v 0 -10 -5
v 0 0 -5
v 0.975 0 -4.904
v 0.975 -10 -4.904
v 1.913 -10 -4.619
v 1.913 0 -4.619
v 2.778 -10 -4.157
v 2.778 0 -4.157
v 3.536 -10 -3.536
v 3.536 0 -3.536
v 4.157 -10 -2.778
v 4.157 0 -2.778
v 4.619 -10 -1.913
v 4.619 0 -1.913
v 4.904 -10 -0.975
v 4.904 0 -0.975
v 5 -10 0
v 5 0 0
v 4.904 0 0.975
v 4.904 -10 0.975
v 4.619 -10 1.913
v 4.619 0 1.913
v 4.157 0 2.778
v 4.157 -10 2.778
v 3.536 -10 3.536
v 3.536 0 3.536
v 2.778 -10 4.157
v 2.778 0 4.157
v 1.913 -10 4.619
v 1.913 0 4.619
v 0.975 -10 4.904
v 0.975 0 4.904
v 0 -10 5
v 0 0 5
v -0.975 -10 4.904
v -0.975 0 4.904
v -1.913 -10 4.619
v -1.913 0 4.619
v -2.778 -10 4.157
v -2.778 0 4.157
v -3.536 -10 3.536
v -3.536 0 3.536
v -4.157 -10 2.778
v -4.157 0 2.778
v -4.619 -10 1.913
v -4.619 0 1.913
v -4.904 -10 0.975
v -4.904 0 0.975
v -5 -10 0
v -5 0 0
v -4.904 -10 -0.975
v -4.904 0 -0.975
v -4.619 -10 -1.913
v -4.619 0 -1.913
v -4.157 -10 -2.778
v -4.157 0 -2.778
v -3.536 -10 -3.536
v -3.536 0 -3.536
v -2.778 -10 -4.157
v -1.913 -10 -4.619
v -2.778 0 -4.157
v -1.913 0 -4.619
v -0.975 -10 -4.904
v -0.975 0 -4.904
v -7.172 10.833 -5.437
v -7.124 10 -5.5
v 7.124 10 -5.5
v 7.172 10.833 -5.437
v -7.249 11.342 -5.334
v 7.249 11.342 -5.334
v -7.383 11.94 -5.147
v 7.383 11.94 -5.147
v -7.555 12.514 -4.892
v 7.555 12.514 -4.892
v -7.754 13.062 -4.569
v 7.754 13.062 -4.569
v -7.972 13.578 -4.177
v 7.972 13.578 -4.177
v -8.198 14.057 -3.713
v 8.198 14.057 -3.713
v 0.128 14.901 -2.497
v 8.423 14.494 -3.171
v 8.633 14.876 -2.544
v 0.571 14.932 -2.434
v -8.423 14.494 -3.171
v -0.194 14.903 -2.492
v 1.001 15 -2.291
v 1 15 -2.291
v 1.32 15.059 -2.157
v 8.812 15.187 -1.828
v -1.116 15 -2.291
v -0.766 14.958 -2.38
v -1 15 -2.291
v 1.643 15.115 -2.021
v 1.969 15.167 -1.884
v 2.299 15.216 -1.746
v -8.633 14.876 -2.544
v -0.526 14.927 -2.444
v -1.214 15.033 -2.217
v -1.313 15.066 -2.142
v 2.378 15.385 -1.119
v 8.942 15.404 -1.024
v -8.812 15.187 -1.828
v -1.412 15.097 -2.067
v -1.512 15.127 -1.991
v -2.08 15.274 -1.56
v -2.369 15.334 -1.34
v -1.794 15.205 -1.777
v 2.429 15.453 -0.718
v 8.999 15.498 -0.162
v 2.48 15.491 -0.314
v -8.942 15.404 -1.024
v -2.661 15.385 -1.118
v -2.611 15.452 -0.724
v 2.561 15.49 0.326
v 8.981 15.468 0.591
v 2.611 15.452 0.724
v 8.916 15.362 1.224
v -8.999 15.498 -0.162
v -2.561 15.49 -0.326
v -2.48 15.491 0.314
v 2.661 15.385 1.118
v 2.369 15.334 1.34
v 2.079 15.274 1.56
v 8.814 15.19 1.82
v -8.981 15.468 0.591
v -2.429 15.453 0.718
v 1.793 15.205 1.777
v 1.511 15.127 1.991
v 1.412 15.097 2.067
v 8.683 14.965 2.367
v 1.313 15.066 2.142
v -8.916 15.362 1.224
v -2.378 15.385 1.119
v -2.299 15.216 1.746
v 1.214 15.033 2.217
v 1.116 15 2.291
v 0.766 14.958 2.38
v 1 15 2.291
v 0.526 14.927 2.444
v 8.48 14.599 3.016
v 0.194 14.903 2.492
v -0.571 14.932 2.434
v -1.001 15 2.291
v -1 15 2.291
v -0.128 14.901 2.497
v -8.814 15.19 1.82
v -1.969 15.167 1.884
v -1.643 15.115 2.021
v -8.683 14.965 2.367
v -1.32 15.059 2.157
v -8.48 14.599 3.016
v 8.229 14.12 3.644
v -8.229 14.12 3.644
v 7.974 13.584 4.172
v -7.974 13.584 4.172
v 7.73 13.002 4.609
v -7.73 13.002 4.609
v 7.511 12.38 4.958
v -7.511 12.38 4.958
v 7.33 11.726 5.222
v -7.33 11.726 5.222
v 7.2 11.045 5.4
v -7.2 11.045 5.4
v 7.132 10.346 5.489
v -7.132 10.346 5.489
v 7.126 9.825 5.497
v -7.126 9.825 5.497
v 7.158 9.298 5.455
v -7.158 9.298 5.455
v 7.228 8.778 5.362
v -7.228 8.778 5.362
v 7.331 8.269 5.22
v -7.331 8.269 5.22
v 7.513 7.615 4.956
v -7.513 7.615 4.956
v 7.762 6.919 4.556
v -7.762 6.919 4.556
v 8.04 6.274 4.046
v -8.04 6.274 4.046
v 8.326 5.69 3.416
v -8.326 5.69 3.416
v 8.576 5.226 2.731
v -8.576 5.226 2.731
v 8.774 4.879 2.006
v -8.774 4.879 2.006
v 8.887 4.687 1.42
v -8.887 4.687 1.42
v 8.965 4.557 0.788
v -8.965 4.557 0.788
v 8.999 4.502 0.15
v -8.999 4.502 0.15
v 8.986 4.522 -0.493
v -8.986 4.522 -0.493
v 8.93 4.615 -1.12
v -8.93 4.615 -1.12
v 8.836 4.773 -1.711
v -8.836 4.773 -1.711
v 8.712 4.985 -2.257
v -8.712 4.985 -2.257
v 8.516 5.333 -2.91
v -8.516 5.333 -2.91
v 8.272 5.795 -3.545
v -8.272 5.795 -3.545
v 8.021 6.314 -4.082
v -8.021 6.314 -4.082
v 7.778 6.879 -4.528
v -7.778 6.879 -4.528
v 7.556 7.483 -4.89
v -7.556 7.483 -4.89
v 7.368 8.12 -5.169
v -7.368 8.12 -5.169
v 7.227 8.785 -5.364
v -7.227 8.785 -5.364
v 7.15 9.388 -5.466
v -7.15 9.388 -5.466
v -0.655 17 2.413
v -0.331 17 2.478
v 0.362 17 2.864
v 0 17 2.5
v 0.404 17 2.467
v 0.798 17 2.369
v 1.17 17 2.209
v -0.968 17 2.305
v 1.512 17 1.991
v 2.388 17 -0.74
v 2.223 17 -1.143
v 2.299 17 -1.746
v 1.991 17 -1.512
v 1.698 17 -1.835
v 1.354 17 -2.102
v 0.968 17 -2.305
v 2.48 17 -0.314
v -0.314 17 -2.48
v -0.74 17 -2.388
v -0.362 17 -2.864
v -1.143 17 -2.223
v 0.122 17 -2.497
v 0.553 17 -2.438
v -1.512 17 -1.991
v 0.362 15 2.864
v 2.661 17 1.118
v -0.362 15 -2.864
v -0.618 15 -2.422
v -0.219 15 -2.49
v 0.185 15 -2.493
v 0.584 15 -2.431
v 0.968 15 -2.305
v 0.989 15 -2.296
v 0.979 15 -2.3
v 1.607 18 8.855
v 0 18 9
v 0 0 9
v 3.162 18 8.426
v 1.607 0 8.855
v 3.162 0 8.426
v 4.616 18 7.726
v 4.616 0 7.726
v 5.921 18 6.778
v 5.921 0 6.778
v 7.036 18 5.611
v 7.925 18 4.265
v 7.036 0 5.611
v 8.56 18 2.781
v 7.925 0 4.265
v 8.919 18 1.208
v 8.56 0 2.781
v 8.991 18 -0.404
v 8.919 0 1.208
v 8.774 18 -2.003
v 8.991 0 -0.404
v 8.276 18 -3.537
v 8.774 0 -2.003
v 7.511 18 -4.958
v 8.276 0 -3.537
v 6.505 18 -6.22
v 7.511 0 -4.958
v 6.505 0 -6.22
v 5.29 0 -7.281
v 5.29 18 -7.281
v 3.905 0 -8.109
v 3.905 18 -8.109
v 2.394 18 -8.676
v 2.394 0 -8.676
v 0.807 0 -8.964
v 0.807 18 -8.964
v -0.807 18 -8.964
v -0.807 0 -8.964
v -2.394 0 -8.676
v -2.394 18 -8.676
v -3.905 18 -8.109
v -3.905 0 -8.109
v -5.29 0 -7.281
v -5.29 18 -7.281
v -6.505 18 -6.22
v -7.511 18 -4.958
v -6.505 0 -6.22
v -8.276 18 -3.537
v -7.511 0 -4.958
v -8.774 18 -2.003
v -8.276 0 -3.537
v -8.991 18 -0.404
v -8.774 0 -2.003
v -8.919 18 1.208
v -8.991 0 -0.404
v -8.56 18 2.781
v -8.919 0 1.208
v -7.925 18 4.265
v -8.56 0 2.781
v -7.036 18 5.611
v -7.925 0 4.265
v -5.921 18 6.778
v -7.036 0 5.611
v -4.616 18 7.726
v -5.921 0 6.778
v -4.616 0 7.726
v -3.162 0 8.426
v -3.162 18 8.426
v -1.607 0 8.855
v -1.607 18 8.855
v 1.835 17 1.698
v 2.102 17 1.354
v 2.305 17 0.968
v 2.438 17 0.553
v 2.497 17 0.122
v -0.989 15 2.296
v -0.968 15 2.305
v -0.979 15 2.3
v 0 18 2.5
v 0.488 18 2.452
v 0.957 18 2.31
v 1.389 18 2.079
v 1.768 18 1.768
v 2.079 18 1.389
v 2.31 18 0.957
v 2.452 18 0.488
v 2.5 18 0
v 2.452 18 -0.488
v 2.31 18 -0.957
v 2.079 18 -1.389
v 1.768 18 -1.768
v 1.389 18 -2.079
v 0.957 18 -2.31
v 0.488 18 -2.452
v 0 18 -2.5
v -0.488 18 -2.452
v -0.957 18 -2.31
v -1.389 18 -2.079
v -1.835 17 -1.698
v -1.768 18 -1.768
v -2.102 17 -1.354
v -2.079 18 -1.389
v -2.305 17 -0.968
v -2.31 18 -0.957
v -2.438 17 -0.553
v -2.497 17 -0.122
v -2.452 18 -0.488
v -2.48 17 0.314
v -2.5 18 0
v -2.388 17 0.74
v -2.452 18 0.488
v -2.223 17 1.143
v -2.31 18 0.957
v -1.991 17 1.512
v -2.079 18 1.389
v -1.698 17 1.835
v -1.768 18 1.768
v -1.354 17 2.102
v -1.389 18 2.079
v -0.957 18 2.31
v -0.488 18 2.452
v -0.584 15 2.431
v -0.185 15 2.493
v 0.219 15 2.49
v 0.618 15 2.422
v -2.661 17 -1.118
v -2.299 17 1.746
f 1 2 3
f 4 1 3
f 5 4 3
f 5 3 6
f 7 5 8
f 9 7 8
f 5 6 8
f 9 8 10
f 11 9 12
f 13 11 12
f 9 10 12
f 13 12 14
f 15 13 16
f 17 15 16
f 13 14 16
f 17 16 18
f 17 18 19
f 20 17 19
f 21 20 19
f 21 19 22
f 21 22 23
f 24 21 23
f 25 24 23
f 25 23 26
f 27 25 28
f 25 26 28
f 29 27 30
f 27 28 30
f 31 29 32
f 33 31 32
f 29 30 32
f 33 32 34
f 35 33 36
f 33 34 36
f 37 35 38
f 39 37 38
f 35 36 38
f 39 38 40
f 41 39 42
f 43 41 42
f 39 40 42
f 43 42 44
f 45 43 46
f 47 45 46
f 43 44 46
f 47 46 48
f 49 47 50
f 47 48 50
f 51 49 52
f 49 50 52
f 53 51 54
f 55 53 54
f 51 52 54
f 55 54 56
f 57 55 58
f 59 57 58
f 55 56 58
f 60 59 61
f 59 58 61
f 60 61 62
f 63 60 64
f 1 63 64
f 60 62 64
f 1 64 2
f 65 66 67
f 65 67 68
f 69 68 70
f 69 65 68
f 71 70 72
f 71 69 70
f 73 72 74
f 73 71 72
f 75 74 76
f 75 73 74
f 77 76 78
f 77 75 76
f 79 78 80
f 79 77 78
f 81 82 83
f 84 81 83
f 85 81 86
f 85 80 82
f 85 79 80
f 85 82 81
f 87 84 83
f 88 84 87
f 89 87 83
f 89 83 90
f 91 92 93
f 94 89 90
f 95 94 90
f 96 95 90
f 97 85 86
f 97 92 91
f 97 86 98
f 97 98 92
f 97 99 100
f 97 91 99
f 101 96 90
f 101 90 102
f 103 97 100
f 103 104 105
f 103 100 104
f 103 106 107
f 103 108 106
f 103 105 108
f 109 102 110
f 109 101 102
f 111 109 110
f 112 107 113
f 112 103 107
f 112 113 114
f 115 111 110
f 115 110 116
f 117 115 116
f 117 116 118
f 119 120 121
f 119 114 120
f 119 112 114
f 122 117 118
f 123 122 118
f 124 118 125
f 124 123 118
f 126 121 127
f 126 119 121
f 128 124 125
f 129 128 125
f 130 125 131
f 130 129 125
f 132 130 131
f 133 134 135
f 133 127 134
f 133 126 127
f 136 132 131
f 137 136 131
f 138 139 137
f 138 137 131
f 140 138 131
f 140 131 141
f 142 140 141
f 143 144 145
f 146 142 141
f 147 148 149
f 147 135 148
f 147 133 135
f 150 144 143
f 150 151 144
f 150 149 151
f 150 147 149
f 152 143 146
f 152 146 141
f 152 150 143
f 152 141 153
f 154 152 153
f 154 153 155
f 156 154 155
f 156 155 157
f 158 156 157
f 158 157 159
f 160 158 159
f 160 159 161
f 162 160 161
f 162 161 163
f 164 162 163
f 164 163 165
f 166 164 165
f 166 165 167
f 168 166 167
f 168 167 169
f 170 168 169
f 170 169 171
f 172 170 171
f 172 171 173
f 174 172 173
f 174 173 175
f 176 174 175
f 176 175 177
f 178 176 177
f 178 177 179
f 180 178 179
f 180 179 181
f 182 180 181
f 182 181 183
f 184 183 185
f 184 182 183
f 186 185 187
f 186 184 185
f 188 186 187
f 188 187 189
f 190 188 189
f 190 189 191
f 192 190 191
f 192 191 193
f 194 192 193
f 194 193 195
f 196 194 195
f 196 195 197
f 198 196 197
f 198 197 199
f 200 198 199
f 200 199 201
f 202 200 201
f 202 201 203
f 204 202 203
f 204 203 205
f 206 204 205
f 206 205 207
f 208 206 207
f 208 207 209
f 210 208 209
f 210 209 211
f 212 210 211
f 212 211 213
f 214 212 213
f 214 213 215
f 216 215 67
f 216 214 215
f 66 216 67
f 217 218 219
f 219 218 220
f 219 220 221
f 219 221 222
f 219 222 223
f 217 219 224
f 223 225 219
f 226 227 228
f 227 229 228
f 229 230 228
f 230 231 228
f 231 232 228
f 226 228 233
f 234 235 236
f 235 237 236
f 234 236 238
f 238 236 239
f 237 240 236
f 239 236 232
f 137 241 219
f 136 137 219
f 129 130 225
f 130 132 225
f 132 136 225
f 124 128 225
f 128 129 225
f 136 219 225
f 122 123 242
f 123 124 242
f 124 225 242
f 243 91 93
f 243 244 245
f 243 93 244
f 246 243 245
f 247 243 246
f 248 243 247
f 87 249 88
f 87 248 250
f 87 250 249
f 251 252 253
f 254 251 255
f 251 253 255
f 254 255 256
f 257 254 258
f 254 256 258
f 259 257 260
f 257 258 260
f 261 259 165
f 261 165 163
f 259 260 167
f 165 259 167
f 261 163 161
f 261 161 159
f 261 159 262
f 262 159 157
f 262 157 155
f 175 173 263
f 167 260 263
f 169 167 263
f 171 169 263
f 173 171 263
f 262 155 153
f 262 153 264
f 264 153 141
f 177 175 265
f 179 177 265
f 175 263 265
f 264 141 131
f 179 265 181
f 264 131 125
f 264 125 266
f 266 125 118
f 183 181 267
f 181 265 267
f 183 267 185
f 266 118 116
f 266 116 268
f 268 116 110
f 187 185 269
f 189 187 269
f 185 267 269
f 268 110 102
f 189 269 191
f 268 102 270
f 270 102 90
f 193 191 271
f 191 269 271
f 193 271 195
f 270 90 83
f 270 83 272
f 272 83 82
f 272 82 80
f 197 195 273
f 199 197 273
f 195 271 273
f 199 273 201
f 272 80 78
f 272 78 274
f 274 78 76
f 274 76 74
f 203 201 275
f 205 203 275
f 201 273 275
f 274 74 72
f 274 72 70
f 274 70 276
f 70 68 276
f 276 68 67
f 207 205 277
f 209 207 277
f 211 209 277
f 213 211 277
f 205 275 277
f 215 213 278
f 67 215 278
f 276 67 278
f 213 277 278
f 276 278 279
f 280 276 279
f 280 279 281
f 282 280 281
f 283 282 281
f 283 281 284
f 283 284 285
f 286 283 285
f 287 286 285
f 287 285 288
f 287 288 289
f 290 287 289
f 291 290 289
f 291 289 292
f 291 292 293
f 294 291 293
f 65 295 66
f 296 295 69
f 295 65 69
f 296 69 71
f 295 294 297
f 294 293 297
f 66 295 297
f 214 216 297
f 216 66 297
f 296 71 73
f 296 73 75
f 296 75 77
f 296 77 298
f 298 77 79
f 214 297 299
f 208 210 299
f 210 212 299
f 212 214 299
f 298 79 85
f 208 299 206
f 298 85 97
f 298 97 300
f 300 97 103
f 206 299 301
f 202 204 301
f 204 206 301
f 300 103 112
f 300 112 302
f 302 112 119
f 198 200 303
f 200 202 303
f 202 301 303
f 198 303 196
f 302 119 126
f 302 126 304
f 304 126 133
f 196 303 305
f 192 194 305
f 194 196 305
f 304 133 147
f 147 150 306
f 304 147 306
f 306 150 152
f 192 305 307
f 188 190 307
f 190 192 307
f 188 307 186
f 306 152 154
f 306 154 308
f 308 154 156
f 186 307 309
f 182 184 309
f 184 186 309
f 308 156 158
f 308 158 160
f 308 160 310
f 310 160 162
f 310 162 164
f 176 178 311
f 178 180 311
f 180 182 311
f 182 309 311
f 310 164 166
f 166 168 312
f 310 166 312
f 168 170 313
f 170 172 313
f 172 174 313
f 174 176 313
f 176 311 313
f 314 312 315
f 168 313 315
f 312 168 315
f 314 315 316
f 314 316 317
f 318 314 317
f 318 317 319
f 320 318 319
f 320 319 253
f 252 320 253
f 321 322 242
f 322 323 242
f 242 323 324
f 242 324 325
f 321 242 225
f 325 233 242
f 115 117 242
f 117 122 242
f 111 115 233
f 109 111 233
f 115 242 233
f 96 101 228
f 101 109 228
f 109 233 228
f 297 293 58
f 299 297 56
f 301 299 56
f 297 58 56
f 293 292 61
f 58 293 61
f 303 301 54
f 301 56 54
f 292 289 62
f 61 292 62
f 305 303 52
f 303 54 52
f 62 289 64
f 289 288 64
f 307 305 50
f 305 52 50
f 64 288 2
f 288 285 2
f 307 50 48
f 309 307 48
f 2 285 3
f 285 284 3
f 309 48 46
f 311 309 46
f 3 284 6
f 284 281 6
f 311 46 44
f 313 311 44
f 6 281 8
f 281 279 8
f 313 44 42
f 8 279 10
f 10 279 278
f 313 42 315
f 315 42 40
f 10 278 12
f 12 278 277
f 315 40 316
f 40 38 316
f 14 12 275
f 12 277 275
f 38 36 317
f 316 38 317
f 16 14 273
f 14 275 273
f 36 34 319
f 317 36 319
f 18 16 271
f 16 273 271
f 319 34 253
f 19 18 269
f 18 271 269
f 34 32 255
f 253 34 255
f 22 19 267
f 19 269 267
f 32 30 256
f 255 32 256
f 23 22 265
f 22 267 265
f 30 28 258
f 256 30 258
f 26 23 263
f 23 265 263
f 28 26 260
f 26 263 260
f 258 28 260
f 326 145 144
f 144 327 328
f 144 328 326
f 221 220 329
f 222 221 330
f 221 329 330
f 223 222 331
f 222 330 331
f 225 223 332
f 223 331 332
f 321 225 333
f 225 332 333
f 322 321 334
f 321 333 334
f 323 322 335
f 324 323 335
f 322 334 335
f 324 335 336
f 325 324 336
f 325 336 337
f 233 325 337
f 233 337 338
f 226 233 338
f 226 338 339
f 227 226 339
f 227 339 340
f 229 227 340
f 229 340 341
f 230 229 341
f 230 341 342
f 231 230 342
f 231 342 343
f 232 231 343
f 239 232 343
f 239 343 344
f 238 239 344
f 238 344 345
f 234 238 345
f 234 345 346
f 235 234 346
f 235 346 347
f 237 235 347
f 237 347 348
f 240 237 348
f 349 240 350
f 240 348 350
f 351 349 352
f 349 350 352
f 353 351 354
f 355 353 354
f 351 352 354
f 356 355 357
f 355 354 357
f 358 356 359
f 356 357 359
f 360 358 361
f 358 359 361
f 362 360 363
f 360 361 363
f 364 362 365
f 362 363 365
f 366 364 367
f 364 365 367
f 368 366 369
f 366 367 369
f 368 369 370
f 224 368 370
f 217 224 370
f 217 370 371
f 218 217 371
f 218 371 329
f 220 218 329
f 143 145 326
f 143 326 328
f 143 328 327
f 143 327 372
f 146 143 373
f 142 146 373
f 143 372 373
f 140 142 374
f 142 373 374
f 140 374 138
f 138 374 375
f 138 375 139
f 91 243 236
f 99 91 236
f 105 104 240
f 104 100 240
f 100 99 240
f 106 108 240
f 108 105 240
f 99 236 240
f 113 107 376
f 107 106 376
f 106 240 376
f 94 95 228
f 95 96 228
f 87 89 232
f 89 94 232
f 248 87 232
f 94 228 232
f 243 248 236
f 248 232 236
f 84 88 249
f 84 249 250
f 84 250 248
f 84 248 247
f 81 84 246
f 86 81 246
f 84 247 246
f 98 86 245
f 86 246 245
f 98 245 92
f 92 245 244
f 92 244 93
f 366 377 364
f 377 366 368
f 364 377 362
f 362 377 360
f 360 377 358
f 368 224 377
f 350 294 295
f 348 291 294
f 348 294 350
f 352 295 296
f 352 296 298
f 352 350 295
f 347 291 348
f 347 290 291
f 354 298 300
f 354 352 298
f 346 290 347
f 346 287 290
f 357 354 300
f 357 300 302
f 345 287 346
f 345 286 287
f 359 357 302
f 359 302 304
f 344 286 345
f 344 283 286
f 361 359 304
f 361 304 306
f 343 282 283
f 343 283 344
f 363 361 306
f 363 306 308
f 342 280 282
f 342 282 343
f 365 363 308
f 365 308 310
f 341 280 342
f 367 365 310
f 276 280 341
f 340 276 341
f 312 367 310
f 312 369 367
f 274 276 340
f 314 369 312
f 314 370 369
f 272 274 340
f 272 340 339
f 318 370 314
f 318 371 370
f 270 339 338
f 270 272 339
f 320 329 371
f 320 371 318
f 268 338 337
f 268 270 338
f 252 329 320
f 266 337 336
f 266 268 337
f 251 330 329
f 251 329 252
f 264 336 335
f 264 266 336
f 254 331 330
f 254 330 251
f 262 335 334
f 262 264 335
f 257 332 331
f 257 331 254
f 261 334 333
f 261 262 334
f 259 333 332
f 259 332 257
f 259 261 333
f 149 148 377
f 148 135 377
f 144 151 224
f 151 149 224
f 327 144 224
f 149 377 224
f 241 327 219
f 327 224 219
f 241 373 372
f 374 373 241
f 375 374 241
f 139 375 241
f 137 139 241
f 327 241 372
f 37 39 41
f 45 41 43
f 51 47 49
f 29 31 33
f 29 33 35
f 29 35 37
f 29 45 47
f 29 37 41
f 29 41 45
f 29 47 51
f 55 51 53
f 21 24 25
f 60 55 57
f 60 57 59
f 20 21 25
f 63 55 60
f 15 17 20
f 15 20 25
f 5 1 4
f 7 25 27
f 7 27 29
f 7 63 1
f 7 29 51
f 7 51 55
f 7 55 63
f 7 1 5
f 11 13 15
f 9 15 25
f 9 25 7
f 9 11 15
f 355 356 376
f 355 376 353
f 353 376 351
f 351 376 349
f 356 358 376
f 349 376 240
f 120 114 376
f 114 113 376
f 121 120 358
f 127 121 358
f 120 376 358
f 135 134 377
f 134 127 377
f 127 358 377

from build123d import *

# Parameters (mm, degrees)
SKETCH1_R               = 9
BOSS_EXTRUDE1_DEPTH     = 18
CUT_EXTRUDE1_DEPTH      = 23.045407685
CUT_EXTRUDE1_DEPTH_BACK = 23.045407685
SKETCH4_R               = 5.5
SKETCH2_R               = 2.5
CUT_EXTRUDE2_DEPTH      = 5
CUT_EXTRUDE6_START      = -1
CUT_EXTRUDE6_DEPTH      = 2
SKETCH8_R               = 5
BOSS_EXTRUDE2_DEPTH     = 10


with BuildPart() as part:
    # Sketch1 → Boss-Extrude1 (new body)
    with BuildSketch(Plane(origin=(0, 0, 0), x_dir=(1, 0, 0), z_dir=(0, 1, 0))):
        with Locations(Location((0, 0, 0), (0, 0, 270))):
            Circle(SKETCH1_R)
    extrude(amount=BOSS_EXTRUDE1_DEPTH)

    # Sketch4 → Cut-Extrude1 (cut, two sides: drawn at the far end of the back side and taken through both)
    with BuildSketch(Plane(origin=(0, 0, 0), x_dir=(0, 0, -1), z_dir=(1, 0, 0)).offset(-CUT_EXTRUDE1_DEPTH_BACK)):
        with Locations((0, 10)):
            Circle(SKETCH4_R)
    extrude(amount=CUT_EXTRUDE1_DEPTH + CUT_EXTRUDE1_DEPTH_BACK, mode=Mode.SUBTRACT)

    # Sketch2 → Cut-Extrude2 (cut)
    with BuildSketch(Plane(origin=(0, 18, 0), x_dir=(1, 0, 0), z_dir=(0, 1, 0))):
        with Locations(Location((0, 0, 0), (0, 0, 270))):
            Circle(SKETCH2_R)
    extrude(amount=-CUT_EXTRUDE2_DEPTH, mode=Mode.SUBTRACT)

    # Sketch7 → Cut-Extrude6 (cut)
    with BuildSketch(Plane(origin=(0, 18, 0), x_dir=(1, 0, 0), z_dir=(0, 1, 0)).offset(CUT_EXTRUDE6_START)):
        Polygon((-2.299117574, -1.74567801), (0.362242716, -2.86393323), (2.66136029, -1.118255221), (2.299117574, 1.74567801), (-0.362242716, 2.86393323), (-2.66136029, 1.118255221), align=None)
    extrude(amount=-CUT_EXTRUDE6_DEPTH, mode=Mode.SUBTRACT)

    # Sketch8 → Boss-Extrude2 (add)
    with BuildSketch(Plane.XZ):
        with Locations(Location((0, 0, 0), (0, 0, 270))):
            Circle(SKETCH8_R)
    extrude(amount=BOSS_EXTRUDE2_DEPTH)


solid = part.part
